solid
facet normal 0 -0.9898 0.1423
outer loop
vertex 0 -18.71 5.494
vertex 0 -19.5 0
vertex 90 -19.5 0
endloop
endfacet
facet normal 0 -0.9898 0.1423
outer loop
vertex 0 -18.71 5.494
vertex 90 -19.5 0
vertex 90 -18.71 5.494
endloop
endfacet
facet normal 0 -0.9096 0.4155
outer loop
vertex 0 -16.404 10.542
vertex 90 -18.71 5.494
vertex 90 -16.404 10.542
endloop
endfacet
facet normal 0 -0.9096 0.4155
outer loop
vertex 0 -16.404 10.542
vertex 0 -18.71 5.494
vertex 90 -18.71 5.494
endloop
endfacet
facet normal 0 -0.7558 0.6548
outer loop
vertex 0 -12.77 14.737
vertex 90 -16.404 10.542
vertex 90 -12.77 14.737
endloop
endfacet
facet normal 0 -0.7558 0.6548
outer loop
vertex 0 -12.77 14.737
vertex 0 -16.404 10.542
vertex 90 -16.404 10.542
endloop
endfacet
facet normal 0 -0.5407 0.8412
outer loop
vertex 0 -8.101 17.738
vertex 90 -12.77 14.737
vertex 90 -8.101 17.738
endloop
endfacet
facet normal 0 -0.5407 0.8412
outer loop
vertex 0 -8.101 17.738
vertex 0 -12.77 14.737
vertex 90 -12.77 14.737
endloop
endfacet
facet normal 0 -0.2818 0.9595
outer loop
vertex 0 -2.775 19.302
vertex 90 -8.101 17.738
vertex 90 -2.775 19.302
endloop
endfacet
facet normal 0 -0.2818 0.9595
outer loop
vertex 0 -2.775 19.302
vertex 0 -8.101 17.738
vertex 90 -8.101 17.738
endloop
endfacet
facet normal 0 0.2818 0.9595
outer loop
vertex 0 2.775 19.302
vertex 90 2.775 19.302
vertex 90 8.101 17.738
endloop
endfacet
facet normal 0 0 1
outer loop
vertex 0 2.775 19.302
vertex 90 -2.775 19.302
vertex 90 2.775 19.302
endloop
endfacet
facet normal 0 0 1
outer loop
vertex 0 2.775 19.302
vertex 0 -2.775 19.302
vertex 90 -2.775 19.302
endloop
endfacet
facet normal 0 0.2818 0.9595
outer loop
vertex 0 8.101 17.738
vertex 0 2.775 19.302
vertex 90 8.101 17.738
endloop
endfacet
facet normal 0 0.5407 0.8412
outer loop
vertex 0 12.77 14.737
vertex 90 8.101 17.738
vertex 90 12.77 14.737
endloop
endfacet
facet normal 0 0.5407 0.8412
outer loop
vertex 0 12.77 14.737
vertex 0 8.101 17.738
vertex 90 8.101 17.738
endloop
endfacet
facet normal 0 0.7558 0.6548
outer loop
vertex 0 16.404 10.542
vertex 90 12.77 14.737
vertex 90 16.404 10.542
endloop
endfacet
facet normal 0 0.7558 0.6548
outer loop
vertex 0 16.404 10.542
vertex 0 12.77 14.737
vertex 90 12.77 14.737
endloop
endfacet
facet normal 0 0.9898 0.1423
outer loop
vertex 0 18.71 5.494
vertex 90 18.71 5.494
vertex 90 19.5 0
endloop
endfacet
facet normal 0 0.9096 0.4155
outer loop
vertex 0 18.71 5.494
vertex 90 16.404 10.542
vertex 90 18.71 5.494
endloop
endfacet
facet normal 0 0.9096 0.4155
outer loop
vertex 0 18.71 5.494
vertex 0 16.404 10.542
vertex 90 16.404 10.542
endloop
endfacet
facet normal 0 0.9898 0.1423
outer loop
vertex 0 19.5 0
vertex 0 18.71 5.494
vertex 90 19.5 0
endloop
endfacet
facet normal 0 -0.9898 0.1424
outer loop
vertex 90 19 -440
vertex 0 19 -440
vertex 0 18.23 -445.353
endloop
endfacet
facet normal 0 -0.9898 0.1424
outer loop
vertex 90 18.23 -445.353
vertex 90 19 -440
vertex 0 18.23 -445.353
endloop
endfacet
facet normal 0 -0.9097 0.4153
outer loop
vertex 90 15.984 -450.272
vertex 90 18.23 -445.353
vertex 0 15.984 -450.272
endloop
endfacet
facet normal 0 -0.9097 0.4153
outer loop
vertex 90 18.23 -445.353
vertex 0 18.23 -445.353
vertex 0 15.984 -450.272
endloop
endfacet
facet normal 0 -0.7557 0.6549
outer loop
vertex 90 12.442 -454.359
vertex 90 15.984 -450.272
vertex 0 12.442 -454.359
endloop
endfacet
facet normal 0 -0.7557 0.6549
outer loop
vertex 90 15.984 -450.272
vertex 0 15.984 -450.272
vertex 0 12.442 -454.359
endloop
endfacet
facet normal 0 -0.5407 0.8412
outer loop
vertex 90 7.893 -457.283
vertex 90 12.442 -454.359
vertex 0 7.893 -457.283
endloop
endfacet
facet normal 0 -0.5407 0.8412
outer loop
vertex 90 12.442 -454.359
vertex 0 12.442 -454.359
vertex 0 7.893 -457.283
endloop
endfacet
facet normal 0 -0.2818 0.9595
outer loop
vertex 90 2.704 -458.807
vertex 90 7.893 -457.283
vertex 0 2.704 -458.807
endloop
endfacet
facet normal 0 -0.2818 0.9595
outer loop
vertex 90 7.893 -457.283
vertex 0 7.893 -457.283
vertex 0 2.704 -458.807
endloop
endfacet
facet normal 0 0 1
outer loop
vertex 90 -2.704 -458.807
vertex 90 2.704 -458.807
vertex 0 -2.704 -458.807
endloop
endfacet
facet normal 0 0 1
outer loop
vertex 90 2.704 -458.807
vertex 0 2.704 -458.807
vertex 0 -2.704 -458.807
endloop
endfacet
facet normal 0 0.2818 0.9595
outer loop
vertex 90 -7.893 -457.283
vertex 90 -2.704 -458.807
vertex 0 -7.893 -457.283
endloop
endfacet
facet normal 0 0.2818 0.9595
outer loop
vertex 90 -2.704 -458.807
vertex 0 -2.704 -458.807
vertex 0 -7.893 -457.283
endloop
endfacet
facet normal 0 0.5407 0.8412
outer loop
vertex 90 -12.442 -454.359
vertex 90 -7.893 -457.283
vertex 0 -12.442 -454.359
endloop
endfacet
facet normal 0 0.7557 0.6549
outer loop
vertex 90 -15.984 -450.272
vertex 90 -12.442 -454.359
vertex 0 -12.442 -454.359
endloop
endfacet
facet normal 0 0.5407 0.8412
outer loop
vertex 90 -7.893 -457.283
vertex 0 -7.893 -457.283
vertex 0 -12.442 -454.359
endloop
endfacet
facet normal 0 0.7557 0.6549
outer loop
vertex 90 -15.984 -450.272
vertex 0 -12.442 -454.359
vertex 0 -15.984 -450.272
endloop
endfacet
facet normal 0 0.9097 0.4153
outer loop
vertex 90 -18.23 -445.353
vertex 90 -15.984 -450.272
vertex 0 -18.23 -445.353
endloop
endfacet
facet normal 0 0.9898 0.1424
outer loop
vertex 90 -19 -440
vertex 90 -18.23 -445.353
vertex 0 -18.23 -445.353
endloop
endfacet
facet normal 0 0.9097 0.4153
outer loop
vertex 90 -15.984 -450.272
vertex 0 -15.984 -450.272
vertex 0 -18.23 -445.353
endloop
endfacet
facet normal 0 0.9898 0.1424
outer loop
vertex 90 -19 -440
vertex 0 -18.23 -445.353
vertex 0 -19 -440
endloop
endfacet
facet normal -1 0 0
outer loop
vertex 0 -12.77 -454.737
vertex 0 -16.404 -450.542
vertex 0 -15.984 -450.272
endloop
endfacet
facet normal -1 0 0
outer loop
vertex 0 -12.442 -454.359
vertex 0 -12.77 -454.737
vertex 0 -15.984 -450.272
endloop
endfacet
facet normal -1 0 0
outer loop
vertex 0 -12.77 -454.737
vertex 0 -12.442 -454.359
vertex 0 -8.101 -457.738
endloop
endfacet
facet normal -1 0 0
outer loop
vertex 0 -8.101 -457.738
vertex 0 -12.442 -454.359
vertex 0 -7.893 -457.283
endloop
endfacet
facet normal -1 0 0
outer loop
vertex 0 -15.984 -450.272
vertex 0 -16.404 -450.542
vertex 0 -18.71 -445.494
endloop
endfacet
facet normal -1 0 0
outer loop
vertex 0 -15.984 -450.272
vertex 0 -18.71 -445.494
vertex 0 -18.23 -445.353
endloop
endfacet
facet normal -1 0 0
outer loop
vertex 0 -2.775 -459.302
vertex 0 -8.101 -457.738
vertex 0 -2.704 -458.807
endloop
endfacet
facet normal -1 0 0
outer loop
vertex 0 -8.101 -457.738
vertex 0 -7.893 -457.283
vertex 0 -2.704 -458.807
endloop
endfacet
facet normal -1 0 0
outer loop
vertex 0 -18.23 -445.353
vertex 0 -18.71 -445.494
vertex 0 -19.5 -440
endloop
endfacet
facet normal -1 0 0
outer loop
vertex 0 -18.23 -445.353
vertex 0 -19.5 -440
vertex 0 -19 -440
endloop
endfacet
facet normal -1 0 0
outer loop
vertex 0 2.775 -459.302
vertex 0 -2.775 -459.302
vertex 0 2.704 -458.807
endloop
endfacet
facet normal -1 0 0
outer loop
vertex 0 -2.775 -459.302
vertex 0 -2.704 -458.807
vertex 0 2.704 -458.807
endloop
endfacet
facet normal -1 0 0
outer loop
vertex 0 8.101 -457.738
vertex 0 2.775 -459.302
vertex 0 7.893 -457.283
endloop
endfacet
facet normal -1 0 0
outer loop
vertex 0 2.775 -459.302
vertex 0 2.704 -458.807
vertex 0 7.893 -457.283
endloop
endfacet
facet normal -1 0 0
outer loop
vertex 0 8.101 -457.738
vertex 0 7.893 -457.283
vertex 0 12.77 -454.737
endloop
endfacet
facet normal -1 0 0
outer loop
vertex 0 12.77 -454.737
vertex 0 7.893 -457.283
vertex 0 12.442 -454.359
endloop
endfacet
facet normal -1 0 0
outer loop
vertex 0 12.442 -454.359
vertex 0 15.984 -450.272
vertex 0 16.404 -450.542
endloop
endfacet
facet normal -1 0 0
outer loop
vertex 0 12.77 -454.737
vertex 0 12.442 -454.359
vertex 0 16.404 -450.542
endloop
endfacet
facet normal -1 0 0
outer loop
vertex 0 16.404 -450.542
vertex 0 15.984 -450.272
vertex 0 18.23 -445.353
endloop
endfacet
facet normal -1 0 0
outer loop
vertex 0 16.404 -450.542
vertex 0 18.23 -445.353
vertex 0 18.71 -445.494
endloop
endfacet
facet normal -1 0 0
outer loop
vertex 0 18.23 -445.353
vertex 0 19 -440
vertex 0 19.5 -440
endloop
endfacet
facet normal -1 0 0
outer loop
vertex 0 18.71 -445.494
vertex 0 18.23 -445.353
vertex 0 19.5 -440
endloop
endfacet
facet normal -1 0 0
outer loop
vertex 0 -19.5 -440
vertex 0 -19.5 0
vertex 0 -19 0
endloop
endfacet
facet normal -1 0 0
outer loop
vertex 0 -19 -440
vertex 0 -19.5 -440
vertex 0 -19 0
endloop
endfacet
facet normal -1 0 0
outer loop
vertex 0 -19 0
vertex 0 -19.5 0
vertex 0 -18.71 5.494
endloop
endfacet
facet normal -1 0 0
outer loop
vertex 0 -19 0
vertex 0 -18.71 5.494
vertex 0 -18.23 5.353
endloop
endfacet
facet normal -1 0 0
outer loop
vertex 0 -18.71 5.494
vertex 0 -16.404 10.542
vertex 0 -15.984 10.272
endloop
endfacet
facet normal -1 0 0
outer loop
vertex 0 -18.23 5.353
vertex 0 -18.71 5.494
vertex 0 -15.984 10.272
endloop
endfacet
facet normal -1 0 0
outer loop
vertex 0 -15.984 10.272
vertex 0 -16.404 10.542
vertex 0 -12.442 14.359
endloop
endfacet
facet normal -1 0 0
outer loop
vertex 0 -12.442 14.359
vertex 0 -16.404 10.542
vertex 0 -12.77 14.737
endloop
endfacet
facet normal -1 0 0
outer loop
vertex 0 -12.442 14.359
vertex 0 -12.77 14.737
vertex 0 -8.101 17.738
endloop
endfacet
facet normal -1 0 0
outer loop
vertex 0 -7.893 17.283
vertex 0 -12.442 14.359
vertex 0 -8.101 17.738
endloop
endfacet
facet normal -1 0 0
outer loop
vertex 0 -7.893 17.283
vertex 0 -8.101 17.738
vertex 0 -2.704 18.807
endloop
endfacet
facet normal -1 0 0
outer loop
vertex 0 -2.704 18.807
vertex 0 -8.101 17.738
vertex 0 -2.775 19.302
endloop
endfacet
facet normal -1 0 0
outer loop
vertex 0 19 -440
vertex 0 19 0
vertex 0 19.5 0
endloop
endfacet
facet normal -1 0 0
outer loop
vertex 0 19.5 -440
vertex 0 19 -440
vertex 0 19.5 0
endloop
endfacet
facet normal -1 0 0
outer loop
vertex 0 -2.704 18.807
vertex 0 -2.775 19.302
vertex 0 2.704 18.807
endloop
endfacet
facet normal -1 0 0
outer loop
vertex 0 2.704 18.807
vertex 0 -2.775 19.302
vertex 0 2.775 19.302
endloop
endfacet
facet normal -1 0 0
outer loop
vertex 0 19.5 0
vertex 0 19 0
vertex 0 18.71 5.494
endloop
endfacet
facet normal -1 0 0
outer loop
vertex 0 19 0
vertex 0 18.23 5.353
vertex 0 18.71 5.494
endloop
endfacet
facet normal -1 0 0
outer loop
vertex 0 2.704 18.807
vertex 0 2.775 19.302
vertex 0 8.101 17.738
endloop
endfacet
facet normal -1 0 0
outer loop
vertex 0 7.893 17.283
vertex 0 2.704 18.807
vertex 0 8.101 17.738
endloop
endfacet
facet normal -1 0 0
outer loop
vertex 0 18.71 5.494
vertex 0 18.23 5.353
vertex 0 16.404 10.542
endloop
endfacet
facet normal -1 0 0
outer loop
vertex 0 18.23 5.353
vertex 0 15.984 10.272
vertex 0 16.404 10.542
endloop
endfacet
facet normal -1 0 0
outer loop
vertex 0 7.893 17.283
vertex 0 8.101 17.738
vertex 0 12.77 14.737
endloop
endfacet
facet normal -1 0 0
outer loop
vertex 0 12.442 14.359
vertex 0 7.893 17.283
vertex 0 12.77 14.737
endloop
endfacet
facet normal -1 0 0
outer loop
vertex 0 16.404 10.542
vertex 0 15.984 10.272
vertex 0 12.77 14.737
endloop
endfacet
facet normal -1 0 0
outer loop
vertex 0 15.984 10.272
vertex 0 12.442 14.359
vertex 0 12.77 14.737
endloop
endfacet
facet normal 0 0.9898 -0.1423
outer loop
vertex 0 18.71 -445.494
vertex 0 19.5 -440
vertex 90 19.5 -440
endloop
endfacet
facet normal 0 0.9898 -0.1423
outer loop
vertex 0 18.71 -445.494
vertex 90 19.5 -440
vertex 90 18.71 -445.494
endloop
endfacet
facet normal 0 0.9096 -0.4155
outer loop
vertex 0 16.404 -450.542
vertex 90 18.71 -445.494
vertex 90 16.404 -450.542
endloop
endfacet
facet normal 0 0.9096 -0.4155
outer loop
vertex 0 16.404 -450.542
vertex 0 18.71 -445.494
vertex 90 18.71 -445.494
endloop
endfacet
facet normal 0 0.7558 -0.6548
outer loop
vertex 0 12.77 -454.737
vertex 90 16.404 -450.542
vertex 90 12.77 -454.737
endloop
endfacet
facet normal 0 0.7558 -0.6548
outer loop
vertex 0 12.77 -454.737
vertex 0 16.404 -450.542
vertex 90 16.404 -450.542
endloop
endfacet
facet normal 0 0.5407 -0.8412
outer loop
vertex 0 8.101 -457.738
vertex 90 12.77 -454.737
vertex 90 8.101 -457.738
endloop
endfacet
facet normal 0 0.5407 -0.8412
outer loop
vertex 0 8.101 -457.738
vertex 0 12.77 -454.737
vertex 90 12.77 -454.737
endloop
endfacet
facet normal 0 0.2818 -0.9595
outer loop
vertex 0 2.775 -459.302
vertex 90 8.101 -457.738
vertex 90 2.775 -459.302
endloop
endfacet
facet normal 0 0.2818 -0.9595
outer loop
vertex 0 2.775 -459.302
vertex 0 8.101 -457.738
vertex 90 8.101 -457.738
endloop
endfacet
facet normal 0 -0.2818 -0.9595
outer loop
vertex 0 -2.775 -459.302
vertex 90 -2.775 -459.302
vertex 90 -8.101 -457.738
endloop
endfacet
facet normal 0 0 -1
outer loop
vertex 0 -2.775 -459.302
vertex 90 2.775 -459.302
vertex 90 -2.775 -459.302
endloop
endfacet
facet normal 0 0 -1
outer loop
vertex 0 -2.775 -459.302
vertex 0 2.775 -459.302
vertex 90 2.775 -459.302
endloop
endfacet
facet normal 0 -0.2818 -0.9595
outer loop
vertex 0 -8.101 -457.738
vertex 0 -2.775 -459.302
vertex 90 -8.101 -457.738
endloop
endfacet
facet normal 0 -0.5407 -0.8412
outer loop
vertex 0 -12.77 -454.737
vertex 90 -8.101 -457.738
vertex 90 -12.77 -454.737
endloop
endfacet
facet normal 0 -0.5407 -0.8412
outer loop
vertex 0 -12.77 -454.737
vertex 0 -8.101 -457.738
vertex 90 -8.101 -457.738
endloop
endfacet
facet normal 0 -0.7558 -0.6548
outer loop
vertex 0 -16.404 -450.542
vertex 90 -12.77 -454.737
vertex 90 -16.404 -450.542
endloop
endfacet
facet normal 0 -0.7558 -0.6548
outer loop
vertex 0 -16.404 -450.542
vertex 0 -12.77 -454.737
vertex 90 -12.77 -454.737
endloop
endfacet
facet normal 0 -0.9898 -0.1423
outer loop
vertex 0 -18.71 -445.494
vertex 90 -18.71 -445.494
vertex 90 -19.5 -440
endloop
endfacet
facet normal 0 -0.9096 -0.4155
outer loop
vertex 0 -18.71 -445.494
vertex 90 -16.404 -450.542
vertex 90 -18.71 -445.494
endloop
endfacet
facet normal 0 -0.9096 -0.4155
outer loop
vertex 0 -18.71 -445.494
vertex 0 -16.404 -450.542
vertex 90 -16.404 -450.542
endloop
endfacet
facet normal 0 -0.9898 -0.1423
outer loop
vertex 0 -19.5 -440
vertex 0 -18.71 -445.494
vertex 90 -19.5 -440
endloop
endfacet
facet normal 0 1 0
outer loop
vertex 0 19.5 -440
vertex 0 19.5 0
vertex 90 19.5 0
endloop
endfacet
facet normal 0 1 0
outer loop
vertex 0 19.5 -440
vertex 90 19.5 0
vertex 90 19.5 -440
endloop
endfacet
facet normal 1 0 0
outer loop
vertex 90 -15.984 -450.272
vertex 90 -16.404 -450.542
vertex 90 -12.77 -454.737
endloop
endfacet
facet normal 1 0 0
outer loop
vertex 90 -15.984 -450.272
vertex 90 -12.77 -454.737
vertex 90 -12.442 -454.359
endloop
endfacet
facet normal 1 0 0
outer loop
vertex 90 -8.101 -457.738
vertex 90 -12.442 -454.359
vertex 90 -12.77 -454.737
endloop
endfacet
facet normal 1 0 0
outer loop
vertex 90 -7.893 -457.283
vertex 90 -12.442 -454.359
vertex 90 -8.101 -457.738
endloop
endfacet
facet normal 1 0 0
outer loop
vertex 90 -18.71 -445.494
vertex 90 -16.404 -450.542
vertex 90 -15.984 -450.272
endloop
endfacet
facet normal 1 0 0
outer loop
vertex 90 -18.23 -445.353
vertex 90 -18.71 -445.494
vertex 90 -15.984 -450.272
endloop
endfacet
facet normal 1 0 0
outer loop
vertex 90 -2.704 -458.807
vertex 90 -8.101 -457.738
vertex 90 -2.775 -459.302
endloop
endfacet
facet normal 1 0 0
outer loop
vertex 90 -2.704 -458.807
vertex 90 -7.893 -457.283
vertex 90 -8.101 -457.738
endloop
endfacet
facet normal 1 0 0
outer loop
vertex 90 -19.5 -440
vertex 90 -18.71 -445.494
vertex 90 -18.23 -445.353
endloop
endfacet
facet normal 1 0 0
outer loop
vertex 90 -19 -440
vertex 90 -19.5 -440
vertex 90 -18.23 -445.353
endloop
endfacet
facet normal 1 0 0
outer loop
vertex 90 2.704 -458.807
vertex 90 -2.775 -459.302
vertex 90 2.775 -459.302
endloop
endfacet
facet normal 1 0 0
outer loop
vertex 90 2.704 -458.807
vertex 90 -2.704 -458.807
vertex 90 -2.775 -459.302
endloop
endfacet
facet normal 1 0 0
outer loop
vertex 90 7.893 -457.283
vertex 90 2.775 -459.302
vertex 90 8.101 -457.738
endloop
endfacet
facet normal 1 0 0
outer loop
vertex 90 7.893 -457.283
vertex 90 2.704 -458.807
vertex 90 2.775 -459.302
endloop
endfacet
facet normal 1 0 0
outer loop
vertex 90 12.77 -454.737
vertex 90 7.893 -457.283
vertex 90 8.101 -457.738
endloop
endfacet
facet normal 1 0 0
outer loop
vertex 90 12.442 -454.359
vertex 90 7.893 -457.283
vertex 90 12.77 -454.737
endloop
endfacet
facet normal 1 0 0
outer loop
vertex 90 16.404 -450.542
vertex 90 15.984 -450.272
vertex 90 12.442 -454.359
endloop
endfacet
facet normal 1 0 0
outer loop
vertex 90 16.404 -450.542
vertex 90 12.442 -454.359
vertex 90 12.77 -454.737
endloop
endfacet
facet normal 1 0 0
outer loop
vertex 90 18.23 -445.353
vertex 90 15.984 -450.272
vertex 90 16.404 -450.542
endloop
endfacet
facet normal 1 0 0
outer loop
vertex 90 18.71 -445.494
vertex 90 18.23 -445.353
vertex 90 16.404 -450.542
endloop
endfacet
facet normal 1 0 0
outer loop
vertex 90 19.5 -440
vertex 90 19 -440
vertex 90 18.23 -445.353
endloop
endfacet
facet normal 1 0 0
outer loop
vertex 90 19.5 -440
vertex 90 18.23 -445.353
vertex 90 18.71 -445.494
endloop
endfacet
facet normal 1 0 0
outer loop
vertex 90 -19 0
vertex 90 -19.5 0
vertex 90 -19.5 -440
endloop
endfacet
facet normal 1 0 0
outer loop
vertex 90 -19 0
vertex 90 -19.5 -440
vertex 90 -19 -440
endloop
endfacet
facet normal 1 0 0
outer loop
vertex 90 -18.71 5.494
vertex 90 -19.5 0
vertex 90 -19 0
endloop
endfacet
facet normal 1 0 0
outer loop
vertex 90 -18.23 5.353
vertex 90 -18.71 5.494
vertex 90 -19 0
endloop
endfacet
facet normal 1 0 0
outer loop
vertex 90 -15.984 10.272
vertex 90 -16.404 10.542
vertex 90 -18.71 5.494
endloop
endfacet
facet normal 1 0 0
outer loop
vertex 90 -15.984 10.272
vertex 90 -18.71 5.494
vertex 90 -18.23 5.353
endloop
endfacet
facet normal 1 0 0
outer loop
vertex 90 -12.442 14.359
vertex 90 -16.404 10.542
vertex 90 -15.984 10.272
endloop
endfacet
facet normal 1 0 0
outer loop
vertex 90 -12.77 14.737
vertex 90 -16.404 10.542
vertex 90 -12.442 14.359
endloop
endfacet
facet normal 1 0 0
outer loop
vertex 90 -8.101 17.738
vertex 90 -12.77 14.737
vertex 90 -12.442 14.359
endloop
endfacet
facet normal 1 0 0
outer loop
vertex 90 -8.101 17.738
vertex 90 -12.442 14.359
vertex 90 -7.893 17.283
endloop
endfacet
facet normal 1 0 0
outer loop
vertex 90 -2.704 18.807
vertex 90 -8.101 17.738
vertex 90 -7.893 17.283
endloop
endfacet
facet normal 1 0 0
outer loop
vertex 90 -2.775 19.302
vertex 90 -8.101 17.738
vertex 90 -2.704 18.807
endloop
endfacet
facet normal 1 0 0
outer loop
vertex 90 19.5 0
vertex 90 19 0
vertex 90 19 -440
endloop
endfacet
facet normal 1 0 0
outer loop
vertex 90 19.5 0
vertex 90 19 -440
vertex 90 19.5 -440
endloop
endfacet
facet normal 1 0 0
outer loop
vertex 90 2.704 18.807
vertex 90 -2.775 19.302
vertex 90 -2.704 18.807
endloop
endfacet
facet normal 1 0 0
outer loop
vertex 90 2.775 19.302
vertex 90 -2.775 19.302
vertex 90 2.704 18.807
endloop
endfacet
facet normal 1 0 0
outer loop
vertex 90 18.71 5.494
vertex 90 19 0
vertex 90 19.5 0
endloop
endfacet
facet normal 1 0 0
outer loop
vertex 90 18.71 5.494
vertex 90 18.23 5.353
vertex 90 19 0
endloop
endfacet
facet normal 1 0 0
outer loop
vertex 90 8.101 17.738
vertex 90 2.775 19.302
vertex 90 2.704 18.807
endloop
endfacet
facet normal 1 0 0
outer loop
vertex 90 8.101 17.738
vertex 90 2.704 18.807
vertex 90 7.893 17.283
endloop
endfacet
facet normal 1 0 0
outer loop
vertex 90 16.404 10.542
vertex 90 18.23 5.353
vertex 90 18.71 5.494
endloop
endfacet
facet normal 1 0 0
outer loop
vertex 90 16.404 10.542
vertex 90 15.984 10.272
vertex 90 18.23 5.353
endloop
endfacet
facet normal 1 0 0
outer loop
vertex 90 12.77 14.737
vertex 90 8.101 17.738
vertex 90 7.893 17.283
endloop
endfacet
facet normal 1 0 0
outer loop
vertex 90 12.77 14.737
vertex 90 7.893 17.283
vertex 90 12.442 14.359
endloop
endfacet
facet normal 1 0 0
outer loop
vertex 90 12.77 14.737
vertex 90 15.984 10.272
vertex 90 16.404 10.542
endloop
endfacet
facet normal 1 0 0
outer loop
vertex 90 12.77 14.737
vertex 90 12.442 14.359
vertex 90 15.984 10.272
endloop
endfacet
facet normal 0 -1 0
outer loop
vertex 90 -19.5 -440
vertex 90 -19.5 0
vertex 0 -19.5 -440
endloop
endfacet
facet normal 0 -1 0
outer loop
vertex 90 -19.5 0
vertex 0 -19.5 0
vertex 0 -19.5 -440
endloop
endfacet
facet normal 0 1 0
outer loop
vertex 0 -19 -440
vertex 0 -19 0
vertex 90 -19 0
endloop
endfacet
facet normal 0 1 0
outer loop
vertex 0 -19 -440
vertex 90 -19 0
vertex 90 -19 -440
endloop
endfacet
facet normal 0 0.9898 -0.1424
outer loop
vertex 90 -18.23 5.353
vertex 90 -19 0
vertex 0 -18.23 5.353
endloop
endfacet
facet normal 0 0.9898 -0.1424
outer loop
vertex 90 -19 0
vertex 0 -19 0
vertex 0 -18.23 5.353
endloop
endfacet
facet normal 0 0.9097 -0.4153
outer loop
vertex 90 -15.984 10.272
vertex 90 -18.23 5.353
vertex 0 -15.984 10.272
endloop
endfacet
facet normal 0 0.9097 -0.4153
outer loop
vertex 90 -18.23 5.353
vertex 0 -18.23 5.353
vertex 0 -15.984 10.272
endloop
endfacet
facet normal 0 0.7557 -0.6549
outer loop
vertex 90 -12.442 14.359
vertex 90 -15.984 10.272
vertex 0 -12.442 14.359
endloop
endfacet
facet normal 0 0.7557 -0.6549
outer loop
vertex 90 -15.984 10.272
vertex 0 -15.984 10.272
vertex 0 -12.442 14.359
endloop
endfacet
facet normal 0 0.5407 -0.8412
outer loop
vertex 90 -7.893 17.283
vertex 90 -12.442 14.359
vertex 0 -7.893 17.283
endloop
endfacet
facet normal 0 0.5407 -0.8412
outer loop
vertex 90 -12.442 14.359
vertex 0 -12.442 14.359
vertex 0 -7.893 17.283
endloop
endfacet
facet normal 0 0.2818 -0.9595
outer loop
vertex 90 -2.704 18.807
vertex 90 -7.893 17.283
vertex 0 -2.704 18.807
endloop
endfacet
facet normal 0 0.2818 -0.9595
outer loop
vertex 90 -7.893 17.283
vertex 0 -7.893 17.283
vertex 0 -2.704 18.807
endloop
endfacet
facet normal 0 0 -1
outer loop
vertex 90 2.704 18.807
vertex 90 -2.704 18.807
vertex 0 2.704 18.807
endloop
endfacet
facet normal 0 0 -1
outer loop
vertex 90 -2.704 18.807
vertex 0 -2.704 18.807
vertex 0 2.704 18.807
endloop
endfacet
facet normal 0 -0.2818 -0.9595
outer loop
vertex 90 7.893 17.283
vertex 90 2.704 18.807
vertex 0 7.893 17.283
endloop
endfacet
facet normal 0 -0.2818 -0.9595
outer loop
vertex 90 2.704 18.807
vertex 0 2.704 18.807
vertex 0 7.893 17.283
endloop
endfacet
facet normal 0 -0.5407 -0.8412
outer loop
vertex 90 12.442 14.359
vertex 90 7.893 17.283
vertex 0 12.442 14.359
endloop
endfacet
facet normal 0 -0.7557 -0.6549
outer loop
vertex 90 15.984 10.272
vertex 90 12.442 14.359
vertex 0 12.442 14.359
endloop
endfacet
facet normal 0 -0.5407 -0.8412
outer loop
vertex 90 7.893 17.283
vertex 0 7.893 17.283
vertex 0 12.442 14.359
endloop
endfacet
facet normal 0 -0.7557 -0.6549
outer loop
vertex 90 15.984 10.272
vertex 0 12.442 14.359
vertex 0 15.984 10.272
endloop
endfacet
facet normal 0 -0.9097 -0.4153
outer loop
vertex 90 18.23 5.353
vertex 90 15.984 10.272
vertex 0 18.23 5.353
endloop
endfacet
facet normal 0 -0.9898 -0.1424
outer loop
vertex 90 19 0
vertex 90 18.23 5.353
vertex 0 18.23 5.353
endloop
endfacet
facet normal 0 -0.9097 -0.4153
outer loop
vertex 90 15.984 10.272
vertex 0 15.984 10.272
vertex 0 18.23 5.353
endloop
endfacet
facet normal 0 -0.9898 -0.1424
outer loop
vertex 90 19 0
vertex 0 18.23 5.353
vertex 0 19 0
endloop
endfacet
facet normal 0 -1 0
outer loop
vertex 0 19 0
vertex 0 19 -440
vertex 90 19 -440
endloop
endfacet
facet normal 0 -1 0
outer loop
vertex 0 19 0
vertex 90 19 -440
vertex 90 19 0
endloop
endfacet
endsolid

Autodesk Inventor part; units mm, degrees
ref_plane "YZ Plane" through (0, 0, 0) normal (1, 0, 0) x (0, 1, 0)
ref_plane "XZ Plane" through (0, 0, 0) normal (0, 1, 0) x (-1, 0, 0)
ref_plane "XY Plane" through (0, 0, 0) normal (0, 0, 1) x (1, 0, 0)
sketch "Sketch1" plane through (0, 0, 0) normal (1, 0, 0) x (0, 1, 0)
  arc A0 (19.5, 0) -> (-19.5, 0) centre (0, 0) ccw
  arc A1 (-19.5, -440) -> (19.5, -440) centre (0, -440) ccw
  line L0 (19.5, 0) -> (19.5, -440)
  line L1 (-19.5, 0) -> (-19.5, -440)
  dimension "d0" = 39
  dimension "d1" = 39
  dimension "d2" = 440
extrude "Extrusion1" add sketch "Sketch1" along normal blind 90
sketch "Sketch2" plane through (0, 0, 0) normal (-1, 0, 0) x (0, 0, 1)
  arc A0 (0, -19) -> (0, 19) centre (0, 0) ccw
  arc A1 (-440, 19.5) -> (-440, -19.5) centre (-440, 0) ccw projected
  arc A2 (-440, 19) -> (-440, -19) centre (-440, 0) ccw
  line L0 (-440, 19) -> (0, 19)
  line L1 (0, -19) -> (-440, -19)
  dimension "d5" = 38
  dimension "d6" = 38
extrude "Extrusion2" cut sketch "Sketch2" against normal through all
properties part number "Băng tải"
